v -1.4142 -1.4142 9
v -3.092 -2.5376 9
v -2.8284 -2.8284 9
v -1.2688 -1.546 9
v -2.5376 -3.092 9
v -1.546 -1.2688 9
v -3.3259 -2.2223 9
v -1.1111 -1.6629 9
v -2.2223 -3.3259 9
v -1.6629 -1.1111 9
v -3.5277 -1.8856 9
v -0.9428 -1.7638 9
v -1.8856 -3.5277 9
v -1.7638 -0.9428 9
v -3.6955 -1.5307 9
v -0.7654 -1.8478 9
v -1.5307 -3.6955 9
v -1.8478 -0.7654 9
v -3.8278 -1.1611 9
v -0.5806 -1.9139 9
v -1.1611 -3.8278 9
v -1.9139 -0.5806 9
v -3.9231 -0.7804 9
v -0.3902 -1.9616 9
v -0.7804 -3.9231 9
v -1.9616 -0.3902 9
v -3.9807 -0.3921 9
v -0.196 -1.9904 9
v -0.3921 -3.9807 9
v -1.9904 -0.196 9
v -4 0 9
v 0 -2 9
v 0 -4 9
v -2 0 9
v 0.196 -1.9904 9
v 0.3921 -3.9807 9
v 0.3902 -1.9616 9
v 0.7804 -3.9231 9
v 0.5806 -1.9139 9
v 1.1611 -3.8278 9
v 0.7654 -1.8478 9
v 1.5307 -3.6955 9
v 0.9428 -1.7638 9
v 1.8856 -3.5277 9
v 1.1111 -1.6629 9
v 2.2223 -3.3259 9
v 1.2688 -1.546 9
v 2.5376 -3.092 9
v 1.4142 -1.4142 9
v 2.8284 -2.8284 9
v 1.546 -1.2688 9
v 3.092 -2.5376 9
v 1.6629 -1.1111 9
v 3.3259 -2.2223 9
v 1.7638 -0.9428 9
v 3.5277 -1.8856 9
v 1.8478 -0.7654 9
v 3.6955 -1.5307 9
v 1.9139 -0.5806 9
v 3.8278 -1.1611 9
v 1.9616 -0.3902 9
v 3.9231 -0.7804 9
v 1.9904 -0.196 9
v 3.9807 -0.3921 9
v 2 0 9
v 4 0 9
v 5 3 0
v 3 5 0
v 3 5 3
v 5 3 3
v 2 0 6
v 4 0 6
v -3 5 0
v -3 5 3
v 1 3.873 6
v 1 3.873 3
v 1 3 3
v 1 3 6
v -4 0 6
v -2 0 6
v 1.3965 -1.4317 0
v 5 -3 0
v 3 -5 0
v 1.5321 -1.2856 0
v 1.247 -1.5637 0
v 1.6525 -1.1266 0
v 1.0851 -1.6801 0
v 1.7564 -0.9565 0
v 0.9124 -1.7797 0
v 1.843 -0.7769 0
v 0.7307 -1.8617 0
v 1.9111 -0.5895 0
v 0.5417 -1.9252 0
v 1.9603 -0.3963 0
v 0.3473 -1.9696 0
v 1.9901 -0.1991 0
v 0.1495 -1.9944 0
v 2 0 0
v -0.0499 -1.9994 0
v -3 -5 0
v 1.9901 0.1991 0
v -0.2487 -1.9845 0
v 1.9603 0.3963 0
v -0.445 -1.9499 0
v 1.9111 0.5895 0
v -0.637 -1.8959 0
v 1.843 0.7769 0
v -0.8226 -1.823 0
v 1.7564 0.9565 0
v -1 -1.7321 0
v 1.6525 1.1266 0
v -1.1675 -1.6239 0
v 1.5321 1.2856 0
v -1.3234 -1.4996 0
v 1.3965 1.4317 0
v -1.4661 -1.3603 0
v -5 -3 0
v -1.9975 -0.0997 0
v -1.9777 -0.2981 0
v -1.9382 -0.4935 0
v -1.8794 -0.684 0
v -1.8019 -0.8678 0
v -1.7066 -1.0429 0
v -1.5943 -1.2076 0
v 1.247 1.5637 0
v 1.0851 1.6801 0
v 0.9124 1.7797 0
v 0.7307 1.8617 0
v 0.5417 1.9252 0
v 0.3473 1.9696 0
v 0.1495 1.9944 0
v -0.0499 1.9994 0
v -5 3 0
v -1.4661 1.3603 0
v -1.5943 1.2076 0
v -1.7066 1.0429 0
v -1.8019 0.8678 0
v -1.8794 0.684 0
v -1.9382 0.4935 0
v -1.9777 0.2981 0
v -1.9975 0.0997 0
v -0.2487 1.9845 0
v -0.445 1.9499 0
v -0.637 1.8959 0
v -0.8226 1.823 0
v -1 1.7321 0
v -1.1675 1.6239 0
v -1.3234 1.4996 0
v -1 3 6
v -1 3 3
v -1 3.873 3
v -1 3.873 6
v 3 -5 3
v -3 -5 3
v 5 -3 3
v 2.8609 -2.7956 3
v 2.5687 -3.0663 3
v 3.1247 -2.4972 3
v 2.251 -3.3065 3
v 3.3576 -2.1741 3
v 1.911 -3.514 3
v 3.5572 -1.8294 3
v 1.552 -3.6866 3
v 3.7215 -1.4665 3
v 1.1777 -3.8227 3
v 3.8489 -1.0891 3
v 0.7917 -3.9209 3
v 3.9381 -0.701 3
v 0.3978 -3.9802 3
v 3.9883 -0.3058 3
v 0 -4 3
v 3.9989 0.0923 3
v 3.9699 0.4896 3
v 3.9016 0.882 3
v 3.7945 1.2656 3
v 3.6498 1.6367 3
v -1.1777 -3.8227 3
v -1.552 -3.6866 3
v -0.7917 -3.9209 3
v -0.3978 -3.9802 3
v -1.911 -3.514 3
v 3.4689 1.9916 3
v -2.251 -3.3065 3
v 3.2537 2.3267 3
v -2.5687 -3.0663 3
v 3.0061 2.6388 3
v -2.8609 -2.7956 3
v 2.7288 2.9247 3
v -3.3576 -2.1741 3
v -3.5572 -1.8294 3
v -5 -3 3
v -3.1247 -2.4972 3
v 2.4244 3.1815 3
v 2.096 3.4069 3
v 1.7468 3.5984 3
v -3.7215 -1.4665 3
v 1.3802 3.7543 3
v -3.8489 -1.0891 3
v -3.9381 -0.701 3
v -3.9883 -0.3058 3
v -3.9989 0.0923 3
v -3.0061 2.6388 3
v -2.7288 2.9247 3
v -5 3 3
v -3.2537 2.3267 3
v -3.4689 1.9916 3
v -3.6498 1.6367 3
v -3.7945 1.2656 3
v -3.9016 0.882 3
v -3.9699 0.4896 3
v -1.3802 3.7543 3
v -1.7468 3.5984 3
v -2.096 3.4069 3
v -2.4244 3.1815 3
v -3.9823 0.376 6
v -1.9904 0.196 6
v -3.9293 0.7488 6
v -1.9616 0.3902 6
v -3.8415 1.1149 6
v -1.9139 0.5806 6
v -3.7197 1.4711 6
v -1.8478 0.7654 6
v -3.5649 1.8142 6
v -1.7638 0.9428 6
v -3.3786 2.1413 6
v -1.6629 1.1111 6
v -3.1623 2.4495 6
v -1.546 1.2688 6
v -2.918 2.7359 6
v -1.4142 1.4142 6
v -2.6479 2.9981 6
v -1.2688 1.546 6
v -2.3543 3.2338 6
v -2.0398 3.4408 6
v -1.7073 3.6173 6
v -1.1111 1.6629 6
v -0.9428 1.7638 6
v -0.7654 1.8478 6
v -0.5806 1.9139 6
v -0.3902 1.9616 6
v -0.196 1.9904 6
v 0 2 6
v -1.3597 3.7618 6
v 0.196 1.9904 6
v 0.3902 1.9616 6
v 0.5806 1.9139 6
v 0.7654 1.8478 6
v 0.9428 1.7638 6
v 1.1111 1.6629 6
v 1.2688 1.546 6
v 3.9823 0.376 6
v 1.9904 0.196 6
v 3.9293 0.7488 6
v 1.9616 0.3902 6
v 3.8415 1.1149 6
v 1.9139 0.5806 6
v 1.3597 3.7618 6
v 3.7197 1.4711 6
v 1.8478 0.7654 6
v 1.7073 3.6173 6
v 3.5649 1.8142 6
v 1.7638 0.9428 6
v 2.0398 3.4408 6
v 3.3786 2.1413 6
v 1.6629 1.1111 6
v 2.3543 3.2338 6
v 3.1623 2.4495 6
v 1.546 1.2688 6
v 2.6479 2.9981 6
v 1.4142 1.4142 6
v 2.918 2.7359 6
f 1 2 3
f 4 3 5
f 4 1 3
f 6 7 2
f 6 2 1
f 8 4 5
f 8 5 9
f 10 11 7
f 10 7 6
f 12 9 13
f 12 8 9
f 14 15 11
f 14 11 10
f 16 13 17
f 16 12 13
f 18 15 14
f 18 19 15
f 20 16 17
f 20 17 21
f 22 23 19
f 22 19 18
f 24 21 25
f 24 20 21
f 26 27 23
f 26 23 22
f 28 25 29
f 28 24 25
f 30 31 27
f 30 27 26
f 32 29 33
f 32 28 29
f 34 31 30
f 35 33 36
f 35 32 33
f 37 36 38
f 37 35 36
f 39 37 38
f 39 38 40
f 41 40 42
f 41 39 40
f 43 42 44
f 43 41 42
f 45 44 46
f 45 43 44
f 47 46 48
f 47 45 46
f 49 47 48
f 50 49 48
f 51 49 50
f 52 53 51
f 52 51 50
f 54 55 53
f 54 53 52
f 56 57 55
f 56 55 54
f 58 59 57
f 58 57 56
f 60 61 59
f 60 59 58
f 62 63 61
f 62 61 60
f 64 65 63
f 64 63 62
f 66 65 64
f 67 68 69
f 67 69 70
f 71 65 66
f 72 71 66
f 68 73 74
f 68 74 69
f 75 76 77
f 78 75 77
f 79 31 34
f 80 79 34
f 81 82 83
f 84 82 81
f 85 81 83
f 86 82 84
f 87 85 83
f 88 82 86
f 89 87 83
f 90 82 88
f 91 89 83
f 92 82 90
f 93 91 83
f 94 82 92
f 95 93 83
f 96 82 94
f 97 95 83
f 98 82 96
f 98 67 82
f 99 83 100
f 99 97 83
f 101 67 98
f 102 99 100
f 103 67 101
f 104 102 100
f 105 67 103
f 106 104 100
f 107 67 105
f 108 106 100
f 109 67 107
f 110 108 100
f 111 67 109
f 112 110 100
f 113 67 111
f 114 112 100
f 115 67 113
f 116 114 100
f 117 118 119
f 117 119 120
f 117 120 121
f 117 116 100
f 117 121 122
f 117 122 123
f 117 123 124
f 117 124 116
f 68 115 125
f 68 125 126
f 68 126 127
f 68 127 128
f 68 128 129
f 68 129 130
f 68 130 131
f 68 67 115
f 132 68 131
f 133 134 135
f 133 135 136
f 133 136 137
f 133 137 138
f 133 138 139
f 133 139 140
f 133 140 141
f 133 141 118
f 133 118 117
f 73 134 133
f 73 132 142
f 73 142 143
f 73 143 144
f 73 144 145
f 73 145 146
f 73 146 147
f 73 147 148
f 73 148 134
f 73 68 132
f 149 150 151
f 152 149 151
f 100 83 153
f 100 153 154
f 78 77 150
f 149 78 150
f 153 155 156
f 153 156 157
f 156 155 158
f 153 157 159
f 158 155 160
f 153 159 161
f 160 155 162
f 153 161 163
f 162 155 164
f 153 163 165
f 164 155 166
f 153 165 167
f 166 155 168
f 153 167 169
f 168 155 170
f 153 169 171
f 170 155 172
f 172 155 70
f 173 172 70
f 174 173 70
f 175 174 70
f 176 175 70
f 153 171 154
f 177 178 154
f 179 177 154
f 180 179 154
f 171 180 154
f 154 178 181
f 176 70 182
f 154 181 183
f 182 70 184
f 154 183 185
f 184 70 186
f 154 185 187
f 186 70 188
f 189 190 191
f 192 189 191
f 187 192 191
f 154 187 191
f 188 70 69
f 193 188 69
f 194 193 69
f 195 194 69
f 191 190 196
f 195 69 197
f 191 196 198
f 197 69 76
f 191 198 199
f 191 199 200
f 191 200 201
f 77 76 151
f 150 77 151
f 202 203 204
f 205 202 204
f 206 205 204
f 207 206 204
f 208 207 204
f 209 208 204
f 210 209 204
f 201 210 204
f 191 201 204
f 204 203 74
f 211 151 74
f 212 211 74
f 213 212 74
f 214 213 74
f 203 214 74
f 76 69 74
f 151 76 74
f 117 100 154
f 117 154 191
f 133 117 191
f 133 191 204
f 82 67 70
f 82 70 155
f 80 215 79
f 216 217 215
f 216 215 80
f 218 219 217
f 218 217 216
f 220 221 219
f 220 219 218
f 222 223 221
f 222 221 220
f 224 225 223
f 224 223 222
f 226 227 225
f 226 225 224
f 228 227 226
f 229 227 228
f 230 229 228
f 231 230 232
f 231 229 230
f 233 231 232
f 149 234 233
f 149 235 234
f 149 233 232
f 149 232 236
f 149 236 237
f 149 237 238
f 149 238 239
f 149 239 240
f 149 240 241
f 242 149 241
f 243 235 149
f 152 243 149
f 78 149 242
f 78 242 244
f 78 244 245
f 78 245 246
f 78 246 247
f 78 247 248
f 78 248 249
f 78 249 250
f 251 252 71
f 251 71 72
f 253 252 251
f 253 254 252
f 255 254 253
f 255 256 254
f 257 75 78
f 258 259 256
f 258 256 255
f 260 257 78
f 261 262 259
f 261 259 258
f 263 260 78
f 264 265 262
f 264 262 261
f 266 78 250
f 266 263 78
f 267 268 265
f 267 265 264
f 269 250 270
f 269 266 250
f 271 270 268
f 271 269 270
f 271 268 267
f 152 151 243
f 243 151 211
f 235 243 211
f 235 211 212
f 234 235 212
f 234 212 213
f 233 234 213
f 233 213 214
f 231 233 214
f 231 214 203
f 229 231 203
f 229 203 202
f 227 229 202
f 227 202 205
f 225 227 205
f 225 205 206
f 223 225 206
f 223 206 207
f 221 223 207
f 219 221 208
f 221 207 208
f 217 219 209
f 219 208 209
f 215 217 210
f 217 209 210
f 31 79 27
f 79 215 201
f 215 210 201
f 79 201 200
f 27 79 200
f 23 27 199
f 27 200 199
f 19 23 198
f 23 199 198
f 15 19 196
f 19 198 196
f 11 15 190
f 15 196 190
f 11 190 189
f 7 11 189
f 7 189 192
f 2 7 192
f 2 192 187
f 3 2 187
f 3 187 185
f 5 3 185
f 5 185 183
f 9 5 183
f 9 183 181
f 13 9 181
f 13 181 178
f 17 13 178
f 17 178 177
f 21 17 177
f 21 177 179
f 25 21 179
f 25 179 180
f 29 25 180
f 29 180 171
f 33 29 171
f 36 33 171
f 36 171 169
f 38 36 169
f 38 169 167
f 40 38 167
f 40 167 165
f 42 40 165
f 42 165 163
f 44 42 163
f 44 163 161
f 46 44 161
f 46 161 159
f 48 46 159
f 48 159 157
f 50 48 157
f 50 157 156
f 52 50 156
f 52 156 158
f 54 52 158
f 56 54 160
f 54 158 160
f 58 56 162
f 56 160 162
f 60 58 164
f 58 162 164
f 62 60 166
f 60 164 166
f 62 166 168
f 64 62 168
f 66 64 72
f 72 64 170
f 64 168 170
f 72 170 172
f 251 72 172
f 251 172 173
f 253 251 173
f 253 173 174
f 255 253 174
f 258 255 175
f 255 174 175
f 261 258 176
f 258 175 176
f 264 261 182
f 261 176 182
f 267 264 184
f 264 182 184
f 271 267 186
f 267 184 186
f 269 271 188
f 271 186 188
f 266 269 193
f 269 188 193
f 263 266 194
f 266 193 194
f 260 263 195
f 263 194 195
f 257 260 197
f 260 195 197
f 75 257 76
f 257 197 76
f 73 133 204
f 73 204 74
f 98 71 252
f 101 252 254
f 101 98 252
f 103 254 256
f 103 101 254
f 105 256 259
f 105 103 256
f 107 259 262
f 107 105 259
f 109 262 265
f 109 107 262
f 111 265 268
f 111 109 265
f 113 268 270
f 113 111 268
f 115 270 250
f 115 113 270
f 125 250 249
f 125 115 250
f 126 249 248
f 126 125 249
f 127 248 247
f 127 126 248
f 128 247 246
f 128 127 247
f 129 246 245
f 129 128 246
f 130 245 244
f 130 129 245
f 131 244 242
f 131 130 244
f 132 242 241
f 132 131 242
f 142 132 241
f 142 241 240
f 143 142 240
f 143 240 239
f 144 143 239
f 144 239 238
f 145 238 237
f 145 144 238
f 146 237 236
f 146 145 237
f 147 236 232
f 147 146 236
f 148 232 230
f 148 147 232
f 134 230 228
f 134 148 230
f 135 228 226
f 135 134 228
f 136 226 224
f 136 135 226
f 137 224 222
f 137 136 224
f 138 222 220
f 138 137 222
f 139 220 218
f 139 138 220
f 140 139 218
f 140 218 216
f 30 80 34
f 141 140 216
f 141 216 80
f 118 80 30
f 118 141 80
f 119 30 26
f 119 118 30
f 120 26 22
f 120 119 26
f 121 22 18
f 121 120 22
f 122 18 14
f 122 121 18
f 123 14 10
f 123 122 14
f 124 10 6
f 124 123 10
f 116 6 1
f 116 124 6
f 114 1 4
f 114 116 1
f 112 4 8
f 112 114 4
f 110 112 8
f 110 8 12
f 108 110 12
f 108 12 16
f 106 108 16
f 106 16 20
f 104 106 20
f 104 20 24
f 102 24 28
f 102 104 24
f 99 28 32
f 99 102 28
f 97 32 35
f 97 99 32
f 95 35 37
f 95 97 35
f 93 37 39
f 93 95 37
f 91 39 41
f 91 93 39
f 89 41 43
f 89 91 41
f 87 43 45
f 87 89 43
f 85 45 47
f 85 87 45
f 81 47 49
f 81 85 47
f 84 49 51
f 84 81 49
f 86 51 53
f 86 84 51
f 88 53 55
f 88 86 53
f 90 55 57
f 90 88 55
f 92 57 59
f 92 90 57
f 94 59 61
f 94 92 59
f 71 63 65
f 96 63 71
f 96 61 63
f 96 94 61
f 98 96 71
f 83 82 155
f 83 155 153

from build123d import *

# Parameters (mm, degrees)
SKETCH2_R           = 2
BOSS_EXTRUDE1_DEPTH = 3
SKETCH3_R           = 2
BOSS_EXTRUDE2_DEPTH = 6
SKETCH4_W           = 8
SKETCH4_H           = 4.603389885
CUT_EXTRUDE1_DEPTH  = 3


with BuildPart() as part:
    # Sketch2 → Boss-Extrude1 (new body)
    with BuildSketch(Plane.XY):
        Polygon((-5, 3), (-3, 5), (3, 5), (5, 3), (5, -3), (3, -5), (-3, -5), (-5, -3), align=None)
        Circle(SKETCH2_R, mode=Mode.SUBTRACT)
    extrude(amount=BOSS_EXTRUDE1_DEPTH)

    # Sketch3 → Boss-Extrude2 (add)
    with BuildSketch(Plane.XY.offset(3)):
        with BuildLine():
            Line((1, 3), (-1, 3))
            Line((-1, 3), (-1, 3.872983346))
            ThreePointArc((-1, 3.872983346), (0, -4), (1, 3.872983346))
            Line((1, 3.872983346), (1, 3))
        make_face()
        Circle(SKETCH3_R, mode=Mode.SUBTRACT)
    extrude(amount=BOSS_EXTRUDE2_DEPTH)

    # Sketch4 → Cut-Extrude1 (cut)
    with BuildSketch(Plane.XY.offset(9)):
        with Locations((0, 2.301694943)):
            Rectangle(SKETCH4_W, SKETCH4_H)
    extrude(amount=-CUT_EXTRUDE1_DEPTH, mode=Mode.SUBTRACT)


solid = part.part
